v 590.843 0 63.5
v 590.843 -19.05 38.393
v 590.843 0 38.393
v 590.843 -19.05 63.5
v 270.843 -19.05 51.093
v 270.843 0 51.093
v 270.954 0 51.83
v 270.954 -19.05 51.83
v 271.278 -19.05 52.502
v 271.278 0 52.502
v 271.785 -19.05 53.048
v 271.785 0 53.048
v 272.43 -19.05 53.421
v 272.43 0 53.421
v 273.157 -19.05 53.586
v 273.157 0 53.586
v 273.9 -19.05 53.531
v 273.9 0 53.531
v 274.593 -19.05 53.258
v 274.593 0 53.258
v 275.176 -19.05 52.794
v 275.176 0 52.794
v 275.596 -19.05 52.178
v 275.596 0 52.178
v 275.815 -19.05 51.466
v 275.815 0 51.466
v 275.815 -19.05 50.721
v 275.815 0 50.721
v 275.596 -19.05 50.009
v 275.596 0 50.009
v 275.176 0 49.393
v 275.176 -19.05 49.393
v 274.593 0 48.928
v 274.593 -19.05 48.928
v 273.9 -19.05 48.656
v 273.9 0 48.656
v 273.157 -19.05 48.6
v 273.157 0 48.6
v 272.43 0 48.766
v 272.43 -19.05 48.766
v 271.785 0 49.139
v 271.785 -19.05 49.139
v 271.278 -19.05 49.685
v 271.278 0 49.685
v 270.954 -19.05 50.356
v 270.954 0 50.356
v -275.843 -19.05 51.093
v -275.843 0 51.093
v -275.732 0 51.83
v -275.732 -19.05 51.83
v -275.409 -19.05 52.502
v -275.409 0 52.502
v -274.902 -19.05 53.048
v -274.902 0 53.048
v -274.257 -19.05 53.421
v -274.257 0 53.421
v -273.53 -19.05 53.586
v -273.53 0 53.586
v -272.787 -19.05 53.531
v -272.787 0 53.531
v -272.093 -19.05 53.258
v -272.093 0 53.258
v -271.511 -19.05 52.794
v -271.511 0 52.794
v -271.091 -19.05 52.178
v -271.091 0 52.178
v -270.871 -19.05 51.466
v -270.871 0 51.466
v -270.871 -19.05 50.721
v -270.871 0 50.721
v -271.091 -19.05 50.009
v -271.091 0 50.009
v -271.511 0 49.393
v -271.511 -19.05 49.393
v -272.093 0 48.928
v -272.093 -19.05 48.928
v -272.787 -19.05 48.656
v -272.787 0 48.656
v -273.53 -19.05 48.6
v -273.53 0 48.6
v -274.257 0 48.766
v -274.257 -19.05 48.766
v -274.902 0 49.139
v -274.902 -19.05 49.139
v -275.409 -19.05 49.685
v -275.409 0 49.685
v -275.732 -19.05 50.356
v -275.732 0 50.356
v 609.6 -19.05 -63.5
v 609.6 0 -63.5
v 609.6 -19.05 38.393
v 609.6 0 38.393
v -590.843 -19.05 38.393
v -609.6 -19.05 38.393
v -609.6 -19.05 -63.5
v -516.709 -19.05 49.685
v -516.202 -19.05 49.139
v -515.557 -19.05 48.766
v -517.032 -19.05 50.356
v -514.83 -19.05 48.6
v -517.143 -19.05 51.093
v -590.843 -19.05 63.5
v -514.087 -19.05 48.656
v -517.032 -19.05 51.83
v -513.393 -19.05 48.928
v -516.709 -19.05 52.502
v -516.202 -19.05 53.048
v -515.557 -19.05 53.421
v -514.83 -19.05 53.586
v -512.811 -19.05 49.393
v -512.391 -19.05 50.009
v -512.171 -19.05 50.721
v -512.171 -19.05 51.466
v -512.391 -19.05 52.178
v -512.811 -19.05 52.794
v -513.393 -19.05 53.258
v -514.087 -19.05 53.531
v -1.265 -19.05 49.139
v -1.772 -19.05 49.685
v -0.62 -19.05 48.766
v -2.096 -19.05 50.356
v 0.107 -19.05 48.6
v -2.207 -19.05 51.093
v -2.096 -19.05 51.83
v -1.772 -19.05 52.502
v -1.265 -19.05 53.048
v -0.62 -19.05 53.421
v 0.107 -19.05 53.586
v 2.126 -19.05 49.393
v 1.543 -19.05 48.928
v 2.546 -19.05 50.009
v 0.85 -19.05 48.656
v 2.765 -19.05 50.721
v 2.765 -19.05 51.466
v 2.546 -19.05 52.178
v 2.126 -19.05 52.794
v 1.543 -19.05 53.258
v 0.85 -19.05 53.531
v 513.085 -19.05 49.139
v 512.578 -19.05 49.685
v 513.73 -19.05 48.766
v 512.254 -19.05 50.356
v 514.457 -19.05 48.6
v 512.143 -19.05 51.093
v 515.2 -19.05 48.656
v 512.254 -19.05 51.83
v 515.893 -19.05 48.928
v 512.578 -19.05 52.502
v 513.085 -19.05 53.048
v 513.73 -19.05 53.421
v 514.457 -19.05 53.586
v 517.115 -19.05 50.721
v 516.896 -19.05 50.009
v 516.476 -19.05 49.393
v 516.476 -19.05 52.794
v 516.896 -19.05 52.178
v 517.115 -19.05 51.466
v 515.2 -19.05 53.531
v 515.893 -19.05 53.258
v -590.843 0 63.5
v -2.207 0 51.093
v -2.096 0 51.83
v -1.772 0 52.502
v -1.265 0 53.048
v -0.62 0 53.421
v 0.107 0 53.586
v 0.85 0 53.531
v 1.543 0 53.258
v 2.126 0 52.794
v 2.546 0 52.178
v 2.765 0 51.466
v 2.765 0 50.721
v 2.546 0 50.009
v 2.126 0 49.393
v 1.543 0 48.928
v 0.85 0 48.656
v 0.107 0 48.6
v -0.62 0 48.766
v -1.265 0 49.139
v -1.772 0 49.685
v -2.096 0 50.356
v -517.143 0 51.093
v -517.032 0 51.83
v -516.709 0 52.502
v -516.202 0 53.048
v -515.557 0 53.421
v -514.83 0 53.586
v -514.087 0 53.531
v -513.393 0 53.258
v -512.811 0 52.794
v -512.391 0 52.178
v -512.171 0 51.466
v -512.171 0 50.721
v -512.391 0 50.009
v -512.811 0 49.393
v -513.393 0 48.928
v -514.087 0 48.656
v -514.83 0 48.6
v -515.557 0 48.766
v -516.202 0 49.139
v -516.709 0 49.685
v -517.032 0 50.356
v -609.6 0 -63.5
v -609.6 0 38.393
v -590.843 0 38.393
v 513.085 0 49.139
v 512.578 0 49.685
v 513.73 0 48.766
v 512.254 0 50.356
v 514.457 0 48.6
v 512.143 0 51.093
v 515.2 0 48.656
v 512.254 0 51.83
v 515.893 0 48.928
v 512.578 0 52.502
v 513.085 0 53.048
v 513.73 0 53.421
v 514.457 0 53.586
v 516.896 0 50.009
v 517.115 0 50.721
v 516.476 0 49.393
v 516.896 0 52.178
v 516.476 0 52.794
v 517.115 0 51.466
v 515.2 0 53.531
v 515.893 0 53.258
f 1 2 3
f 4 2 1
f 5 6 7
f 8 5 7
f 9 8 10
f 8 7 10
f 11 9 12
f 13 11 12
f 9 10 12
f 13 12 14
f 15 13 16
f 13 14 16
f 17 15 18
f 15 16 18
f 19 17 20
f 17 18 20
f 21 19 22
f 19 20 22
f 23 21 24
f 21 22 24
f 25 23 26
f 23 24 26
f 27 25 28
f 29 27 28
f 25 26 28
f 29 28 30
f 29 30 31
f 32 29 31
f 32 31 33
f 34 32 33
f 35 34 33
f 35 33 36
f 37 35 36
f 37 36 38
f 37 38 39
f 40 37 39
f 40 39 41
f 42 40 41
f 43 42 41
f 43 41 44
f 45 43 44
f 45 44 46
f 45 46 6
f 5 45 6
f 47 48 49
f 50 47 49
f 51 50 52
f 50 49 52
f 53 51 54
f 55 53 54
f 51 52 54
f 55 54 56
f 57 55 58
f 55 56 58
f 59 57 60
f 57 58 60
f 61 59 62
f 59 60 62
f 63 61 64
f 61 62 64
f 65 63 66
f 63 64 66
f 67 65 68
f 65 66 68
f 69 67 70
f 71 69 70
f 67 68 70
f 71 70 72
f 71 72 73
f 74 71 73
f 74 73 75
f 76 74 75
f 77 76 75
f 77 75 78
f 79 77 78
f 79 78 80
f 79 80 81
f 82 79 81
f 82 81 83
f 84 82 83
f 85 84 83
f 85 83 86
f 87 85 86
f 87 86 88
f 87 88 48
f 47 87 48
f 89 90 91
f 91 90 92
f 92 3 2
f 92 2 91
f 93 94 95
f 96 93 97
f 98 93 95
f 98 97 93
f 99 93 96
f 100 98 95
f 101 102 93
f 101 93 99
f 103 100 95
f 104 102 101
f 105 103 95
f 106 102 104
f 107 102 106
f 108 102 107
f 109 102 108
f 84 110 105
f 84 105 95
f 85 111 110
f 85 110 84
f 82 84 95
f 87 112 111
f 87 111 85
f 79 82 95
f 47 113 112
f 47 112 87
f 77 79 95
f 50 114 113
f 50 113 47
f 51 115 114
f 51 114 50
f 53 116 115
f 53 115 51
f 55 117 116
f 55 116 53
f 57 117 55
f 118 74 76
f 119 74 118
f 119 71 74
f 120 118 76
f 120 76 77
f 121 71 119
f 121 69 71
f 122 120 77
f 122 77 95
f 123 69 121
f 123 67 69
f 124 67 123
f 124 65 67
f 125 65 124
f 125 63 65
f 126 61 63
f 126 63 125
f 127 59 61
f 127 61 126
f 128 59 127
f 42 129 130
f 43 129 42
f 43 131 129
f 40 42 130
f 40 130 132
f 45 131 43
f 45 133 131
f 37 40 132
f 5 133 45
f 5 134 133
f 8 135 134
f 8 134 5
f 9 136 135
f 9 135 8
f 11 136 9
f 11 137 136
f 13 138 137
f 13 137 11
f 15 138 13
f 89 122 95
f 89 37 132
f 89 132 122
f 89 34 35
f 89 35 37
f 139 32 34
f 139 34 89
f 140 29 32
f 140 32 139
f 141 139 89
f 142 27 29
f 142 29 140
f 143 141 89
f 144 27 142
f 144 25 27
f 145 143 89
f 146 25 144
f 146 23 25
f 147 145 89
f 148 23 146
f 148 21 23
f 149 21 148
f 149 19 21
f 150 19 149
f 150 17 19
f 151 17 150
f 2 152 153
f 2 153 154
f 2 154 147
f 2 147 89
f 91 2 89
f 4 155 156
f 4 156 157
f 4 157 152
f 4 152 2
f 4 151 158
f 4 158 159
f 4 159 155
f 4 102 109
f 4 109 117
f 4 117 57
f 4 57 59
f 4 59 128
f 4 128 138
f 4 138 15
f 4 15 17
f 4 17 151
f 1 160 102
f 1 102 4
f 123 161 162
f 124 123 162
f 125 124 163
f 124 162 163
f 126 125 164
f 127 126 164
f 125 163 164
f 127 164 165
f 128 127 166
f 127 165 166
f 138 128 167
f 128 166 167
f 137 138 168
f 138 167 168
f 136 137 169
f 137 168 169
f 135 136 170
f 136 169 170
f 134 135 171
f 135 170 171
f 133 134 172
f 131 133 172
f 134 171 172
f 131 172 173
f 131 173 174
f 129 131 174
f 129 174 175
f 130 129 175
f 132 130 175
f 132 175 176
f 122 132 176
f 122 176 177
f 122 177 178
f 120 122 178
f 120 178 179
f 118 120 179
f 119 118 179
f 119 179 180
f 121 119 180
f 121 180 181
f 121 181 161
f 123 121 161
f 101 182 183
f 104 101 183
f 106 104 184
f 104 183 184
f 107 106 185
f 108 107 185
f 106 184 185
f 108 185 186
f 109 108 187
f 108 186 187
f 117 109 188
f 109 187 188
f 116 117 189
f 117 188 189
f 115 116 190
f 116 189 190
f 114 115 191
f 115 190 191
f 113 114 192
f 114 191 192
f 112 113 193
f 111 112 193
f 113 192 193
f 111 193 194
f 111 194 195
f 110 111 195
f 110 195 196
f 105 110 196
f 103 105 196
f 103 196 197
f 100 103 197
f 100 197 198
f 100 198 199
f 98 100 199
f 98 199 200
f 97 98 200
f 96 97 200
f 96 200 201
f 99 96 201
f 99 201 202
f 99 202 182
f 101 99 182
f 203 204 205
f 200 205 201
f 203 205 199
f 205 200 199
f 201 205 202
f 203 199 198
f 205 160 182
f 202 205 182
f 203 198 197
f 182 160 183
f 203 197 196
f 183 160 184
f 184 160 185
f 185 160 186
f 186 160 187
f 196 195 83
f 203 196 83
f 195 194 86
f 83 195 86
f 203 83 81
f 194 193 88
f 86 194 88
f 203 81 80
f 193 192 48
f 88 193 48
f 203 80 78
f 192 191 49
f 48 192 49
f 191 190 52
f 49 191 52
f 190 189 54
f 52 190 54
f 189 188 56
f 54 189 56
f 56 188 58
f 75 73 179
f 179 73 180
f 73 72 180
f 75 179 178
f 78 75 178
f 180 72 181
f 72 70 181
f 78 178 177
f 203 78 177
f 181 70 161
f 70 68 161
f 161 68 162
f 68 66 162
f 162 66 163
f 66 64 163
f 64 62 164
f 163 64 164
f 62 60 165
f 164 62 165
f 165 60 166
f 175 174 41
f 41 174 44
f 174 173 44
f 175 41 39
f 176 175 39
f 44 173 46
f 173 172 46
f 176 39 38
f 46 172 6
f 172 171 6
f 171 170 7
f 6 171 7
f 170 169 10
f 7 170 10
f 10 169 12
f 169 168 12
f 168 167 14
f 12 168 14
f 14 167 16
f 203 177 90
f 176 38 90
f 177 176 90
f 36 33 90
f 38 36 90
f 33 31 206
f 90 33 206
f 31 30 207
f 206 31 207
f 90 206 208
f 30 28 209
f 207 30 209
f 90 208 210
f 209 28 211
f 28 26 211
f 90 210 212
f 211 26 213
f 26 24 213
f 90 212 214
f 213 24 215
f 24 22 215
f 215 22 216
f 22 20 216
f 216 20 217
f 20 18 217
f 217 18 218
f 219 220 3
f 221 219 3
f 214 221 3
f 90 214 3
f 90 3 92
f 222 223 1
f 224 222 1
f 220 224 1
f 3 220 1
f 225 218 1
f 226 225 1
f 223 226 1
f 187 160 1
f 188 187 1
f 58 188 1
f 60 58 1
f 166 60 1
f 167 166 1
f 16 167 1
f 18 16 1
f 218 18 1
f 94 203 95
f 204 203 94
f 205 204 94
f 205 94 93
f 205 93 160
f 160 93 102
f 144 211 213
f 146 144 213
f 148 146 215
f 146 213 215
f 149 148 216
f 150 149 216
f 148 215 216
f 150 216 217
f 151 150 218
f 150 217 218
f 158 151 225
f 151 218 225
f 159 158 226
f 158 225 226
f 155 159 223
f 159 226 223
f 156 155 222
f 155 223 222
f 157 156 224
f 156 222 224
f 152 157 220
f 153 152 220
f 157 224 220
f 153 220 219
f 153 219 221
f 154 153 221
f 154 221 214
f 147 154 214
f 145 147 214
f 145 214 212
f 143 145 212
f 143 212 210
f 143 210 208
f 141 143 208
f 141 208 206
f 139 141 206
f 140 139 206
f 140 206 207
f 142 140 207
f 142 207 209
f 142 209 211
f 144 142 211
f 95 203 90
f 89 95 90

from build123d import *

# Parameters (mm, degrees)
F0_W     = 1219.2
F0_H     = 127
F1_DEPTH = 19.05
F2_W     = 18.75663
F2_H     = 25.10663
F3_DEPTH = 19.051
F5_D     = 5


with BuildPart() as f1:
    # F0 (on Front) → F1 (new body)
    with BuildSketch(Plane.XZ):
        Rectangle(F0_W, F0_H)
    extrude(amount=F1_DEPTH)

    # F2 (on face) → F3 (cut, through all)
    with BuildSketch(Plane.XZ.offset(19.05)):
        with Locations((-600.221685, 50.946685)):
            Rectangle(F2_W, F2_H)
        with Locations((600.221685, 50.946685)):
            Rectangle(F2_W, F2_H)
    extrude(amount=-F3_DEPTH, mode=Mode.SUBTRACT)

    # F5 (through all)
    with Locations(Plane.XZ.offset(19.05)):
        with Locations((-514.64337, 51.09337), (-273.34337, 51.09337), (0.29337, 51.09337), (273.34337, 51.09337), (514.64337, 51.09337)):
            Hole(F5_D / 2)


solid = f1.part
